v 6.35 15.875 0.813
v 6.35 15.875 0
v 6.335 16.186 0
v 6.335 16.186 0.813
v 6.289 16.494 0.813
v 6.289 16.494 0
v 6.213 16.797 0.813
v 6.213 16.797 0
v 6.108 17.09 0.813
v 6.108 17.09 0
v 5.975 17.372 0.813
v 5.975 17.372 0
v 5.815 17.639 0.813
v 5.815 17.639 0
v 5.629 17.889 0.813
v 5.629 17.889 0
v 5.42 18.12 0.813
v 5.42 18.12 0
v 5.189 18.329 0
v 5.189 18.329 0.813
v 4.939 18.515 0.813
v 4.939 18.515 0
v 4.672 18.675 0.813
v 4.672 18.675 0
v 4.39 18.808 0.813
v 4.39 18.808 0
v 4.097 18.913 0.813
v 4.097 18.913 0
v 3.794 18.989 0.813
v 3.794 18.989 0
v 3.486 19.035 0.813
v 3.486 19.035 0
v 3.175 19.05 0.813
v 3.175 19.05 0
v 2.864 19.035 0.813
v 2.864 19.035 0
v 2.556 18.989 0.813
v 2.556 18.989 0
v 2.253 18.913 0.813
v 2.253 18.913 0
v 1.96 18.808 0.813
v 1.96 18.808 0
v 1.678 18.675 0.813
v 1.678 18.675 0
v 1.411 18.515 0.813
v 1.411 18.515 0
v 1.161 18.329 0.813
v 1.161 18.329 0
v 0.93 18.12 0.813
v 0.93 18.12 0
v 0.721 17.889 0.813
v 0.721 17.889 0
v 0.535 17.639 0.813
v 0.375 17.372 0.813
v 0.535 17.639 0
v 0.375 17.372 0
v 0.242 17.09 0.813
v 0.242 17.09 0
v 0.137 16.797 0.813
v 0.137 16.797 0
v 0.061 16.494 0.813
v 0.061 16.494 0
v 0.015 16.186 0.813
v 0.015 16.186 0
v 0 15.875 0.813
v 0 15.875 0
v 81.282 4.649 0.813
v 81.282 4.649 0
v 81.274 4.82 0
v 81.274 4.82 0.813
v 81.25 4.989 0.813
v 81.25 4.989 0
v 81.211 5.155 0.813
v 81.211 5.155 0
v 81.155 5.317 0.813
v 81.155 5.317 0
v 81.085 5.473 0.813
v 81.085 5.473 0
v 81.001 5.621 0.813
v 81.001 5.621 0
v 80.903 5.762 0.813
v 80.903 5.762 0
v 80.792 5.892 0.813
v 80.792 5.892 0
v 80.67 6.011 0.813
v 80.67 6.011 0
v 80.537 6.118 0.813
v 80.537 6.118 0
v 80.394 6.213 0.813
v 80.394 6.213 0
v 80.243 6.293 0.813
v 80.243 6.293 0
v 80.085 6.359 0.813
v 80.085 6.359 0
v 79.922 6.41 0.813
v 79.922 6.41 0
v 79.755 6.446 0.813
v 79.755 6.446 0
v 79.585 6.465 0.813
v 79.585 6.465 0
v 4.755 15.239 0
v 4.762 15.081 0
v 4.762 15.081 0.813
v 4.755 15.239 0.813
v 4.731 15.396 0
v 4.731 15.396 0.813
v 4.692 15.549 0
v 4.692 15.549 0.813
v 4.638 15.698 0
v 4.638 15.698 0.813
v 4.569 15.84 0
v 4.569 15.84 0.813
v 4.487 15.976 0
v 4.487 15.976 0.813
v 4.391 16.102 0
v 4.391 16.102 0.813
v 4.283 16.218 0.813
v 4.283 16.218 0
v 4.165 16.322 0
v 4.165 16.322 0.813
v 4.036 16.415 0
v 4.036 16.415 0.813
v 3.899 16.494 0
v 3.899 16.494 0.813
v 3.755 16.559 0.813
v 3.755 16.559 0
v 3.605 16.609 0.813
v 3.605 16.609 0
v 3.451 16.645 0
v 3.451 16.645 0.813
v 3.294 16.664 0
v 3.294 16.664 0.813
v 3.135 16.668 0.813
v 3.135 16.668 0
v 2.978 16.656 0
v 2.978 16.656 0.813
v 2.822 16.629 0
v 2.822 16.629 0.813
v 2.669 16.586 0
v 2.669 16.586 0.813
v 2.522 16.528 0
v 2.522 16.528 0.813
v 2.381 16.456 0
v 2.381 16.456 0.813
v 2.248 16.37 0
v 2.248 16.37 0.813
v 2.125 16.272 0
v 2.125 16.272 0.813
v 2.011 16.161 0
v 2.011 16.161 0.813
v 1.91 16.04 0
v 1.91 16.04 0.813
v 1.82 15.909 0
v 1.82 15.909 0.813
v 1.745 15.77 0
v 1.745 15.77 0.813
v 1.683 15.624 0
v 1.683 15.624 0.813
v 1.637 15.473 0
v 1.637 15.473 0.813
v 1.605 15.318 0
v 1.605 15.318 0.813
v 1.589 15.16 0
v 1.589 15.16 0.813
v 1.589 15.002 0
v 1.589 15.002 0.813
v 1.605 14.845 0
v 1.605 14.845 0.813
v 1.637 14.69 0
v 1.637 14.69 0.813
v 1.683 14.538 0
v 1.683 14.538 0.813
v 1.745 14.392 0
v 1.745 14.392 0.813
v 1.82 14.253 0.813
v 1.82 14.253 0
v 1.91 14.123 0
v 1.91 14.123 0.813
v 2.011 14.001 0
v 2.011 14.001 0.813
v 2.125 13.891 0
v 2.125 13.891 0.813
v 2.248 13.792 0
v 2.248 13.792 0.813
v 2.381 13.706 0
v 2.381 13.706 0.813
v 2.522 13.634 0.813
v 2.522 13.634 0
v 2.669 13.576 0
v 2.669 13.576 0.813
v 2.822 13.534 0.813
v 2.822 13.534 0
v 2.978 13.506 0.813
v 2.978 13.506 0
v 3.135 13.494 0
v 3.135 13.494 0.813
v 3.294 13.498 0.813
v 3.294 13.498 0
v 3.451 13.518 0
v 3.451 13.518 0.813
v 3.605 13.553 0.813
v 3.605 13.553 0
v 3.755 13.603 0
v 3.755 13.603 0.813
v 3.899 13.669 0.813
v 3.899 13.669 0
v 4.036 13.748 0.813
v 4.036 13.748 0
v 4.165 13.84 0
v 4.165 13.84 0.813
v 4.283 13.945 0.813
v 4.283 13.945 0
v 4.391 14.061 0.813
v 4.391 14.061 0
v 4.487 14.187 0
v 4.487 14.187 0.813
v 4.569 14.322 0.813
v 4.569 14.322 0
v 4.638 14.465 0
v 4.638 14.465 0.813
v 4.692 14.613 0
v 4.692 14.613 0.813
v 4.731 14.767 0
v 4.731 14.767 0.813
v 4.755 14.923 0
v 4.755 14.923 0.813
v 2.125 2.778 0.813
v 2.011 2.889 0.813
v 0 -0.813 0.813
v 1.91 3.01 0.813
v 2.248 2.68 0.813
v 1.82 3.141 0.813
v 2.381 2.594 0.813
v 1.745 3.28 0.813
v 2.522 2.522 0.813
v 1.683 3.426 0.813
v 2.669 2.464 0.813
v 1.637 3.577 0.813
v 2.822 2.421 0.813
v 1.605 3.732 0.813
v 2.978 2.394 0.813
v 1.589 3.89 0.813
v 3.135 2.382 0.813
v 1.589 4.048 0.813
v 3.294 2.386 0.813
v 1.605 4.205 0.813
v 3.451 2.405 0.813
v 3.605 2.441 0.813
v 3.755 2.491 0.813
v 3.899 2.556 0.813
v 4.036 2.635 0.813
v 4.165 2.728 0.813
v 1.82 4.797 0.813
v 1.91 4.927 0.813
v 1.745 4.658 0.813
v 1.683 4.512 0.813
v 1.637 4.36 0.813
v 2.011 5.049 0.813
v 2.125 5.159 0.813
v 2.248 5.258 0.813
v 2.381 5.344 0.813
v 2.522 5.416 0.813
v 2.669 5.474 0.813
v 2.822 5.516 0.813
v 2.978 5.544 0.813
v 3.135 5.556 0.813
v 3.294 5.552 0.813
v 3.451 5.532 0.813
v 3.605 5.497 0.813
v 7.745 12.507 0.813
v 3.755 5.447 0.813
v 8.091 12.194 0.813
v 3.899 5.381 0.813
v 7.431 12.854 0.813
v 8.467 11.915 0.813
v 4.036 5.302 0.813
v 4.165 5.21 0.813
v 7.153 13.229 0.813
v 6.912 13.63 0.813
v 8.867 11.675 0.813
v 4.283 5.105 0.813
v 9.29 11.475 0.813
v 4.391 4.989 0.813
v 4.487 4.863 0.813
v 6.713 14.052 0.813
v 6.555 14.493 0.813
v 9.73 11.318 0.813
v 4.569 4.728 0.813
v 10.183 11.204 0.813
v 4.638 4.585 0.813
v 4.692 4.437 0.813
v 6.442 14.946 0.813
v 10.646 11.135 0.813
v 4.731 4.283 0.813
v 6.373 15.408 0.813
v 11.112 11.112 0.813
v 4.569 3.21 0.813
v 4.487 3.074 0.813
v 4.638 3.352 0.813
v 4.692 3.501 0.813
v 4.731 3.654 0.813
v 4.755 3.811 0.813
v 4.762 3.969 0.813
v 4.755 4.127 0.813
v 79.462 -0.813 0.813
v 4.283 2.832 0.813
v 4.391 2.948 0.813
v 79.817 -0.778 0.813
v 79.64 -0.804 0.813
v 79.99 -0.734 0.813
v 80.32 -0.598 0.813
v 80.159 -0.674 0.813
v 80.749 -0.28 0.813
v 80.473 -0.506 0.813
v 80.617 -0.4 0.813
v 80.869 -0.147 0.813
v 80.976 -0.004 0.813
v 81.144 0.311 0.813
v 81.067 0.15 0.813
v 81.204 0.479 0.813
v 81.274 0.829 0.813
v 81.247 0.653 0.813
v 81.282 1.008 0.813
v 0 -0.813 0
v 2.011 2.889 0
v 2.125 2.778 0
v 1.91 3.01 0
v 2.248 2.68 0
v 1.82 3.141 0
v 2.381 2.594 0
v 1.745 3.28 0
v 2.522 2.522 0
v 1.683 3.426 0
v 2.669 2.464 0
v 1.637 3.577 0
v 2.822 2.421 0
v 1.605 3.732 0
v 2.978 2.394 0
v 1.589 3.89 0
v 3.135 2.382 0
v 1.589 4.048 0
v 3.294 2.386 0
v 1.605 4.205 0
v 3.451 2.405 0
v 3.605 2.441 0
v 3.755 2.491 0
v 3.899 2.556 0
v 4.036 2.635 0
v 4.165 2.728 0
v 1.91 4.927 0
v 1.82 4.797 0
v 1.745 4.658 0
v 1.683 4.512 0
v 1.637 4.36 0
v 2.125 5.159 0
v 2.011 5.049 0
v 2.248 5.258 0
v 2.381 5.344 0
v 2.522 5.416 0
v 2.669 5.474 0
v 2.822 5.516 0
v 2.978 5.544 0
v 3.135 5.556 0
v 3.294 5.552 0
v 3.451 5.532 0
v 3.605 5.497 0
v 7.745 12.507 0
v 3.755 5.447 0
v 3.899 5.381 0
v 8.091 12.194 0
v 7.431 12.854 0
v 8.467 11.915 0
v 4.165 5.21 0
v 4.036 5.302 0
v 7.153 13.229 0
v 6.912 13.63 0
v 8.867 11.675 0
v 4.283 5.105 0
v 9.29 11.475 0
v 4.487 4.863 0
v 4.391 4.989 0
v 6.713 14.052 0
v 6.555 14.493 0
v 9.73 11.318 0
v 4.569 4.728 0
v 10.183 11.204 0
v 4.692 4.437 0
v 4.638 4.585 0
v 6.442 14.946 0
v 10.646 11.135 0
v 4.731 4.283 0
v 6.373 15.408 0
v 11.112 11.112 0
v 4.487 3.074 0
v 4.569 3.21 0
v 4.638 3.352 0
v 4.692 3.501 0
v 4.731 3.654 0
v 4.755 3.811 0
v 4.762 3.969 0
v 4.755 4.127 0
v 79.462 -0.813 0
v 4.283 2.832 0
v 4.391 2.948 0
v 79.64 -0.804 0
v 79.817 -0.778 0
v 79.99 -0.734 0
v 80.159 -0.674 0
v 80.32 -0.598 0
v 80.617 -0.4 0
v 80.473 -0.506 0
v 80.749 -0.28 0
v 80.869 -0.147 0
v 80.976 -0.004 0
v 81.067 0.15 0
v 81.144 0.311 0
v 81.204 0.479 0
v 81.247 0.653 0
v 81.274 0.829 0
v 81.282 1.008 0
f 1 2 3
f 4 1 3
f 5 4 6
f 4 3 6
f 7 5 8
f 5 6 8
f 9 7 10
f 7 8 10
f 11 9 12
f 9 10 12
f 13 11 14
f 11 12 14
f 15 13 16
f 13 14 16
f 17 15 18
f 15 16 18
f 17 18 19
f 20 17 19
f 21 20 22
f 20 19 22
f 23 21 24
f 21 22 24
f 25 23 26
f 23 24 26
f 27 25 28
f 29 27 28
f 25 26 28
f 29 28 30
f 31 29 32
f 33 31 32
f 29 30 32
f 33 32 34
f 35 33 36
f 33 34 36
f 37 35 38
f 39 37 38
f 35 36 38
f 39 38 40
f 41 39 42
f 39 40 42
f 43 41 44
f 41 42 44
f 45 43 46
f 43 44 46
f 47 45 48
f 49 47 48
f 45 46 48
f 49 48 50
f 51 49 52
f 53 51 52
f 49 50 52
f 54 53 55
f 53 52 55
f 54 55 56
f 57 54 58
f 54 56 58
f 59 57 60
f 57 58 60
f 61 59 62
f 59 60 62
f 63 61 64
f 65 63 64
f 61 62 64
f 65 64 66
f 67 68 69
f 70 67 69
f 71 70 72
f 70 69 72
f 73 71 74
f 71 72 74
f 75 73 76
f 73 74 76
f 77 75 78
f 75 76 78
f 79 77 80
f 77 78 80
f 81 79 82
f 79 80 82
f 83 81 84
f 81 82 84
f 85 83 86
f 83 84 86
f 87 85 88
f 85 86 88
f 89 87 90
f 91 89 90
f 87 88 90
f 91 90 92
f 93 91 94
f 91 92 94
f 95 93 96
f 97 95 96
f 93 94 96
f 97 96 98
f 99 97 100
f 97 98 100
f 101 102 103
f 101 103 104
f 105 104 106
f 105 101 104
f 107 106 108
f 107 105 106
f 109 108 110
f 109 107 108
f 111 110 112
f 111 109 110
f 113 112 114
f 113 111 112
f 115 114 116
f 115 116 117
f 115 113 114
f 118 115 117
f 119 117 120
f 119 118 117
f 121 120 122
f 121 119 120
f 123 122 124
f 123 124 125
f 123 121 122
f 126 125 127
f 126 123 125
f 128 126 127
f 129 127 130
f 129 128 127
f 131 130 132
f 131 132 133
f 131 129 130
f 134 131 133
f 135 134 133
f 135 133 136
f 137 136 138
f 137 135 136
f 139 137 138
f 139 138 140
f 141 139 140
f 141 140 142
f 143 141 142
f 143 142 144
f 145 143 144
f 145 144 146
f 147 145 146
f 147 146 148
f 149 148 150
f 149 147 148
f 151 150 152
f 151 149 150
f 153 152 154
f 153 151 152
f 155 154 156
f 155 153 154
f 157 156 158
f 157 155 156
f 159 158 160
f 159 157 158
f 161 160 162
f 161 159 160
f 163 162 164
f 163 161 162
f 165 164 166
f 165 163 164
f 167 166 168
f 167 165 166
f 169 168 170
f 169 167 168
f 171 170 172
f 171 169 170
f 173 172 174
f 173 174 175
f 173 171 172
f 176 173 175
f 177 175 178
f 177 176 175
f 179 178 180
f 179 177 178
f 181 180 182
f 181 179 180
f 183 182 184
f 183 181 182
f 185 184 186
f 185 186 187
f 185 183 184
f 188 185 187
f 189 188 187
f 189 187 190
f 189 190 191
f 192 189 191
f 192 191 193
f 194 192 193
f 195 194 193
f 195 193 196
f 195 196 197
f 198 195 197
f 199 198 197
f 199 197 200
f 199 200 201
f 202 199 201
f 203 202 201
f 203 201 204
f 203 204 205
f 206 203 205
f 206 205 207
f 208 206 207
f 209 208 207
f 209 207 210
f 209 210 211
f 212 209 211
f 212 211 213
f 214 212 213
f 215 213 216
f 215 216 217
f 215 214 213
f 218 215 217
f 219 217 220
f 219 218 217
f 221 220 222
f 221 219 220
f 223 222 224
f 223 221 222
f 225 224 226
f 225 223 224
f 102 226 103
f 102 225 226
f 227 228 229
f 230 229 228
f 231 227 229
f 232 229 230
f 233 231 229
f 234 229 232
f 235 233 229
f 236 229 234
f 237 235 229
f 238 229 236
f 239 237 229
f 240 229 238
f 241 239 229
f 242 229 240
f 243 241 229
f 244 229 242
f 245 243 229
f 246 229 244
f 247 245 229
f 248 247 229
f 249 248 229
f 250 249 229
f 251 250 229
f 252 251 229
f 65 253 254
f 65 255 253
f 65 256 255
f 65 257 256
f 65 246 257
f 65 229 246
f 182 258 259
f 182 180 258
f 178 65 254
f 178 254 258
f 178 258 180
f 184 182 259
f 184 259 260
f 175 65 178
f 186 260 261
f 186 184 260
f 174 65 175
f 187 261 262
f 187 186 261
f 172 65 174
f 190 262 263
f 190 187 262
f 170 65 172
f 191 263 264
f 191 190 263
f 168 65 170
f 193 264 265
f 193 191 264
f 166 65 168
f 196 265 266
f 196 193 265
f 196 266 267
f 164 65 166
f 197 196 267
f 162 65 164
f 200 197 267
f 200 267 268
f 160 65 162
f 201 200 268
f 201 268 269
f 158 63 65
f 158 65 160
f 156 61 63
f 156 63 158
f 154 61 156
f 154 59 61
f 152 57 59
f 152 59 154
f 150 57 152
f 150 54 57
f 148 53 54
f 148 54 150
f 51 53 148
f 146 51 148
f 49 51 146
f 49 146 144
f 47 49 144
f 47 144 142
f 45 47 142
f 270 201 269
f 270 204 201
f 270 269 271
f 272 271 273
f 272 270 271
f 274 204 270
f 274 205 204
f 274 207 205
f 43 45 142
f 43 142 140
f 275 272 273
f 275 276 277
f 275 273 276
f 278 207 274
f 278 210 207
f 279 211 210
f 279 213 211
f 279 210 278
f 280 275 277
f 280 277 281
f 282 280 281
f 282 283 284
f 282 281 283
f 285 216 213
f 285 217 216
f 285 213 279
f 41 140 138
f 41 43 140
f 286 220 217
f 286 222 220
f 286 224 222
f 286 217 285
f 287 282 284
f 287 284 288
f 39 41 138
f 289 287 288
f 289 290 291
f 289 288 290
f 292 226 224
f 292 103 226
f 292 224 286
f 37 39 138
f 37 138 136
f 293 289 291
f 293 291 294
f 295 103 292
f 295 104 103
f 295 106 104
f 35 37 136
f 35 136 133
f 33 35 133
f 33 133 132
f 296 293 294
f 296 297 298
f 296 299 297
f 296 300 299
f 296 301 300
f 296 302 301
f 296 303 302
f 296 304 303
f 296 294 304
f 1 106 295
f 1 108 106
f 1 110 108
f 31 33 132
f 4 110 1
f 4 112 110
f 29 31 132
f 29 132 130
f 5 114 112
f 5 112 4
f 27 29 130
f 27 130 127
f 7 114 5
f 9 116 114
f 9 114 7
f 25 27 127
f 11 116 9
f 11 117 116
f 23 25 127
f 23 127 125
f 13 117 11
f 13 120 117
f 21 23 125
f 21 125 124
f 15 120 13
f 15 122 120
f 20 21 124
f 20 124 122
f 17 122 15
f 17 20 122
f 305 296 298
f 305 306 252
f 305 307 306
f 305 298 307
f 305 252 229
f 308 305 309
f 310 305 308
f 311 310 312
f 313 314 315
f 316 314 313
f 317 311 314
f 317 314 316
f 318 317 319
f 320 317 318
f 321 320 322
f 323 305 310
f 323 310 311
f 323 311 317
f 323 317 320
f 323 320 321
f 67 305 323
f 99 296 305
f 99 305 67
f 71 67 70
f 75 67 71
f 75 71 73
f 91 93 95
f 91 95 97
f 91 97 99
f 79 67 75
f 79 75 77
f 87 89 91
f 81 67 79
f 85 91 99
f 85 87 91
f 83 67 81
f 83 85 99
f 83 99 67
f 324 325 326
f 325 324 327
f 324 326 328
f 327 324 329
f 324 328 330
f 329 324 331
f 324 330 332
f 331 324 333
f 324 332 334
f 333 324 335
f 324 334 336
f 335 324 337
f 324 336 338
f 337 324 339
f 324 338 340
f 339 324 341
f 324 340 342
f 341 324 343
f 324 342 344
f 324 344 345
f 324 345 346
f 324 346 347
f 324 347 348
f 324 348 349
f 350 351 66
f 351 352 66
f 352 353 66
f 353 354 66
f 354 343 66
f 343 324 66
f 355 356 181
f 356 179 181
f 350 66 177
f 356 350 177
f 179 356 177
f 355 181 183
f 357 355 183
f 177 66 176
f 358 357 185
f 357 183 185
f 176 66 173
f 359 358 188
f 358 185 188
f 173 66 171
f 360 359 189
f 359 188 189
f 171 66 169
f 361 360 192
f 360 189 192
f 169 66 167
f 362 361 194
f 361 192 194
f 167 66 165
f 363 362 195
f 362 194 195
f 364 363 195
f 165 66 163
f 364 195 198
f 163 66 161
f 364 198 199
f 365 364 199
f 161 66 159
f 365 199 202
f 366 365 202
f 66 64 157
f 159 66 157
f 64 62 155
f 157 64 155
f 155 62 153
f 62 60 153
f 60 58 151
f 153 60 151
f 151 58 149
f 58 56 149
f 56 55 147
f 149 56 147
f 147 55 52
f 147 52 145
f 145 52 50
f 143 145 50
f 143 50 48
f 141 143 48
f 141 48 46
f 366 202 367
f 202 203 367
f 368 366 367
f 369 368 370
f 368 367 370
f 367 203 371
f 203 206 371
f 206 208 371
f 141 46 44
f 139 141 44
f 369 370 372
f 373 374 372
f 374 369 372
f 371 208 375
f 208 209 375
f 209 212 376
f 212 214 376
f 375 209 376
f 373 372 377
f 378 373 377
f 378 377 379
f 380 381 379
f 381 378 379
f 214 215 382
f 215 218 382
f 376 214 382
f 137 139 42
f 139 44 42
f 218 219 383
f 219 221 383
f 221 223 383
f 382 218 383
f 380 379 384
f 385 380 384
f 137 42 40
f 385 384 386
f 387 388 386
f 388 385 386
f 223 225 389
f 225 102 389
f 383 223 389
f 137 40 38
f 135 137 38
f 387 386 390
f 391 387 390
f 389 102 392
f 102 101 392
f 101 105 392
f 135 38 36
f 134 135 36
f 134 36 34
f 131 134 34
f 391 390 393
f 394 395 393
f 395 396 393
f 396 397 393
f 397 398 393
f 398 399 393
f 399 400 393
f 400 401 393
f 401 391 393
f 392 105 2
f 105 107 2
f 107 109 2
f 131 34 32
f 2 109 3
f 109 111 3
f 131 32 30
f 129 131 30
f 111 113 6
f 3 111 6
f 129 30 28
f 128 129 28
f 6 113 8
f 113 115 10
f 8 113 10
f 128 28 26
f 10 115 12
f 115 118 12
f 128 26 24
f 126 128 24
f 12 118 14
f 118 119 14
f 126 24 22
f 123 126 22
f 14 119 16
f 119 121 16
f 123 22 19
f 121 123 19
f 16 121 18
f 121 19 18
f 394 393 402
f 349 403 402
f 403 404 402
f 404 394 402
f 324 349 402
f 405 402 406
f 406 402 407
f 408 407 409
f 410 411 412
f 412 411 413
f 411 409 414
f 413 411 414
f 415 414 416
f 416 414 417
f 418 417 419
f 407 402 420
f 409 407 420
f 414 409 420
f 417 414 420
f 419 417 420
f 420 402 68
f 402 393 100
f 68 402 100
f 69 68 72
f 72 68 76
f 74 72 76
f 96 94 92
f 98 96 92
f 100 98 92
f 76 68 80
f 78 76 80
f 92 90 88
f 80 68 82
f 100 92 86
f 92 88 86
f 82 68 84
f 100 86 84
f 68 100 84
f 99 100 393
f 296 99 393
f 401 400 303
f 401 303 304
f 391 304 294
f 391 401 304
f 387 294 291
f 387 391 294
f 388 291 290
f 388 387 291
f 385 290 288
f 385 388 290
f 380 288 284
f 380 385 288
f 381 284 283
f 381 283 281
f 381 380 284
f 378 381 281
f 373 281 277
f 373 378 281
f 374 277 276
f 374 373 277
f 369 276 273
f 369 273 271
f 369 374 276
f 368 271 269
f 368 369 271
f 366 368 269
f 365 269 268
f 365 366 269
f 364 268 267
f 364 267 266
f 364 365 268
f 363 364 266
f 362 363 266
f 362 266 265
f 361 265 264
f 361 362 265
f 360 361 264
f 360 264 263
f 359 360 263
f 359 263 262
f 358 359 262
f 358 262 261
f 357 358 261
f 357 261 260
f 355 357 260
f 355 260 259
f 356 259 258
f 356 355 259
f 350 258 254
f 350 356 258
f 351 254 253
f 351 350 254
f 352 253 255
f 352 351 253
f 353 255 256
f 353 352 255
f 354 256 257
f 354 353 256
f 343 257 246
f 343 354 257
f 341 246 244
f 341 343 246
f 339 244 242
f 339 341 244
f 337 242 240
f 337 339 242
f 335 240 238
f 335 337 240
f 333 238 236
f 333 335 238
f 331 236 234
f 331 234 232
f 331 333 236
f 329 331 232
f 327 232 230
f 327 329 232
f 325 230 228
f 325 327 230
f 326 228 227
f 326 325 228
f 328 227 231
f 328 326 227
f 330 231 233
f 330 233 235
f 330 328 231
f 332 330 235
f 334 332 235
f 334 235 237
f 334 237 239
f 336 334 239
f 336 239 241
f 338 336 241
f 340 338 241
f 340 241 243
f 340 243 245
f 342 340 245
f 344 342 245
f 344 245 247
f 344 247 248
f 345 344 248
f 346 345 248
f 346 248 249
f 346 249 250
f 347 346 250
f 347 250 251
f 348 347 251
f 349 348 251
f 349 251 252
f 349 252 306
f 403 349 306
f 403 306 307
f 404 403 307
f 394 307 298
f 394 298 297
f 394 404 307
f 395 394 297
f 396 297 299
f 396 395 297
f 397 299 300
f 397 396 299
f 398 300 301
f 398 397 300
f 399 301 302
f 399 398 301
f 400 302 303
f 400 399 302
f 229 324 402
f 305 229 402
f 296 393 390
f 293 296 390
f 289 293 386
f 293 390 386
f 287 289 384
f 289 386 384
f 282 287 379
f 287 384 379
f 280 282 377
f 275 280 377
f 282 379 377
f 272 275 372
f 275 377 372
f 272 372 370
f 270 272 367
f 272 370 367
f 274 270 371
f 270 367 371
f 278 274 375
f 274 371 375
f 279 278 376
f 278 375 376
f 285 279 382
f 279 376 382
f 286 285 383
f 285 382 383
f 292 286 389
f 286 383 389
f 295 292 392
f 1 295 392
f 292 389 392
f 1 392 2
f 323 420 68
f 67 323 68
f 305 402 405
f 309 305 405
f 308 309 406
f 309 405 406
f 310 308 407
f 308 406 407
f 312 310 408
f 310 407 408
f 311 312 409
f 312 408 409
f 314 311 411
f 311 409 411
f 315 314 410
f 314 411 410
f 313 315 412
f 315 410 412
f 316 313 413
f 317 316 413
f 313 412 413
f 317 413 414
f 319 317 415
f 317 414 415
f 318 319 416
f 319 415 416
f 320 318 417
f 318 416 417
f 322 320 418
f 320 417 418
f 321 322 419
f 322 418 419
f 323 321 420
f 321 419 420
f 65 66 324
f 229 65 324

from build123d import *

# Parameters (mm, degrees)
SKETCH1_R           = 1.5875
BOSS_EXTRUDE1_DEPTH = 0.8128


with BuildPart() as part:
    # Sketch1 → Boss-Extrude1 (new body)
    with BuildSketch(Plane.XY):
        with BuildLine():
            Line((0, -0.8128), (79.461894979, -0.8128))
            ThreePointArc((79.461894979, -0.8128), (80.749213577, -0.279575177), (81.2824384, 1.007743421))
            Line((81.2824384, 1.007743421), (81.2824384, 4.648830263))
            ThreePointArc((81.2824384, 4.648830263), (80.792085251, 5.891799366), (79.585173538, 6.465194969))
            Line((79.585173538, 6.465194969), (11.1125, 11.1125))
            ThreePointArc((11.1125, 11.1125), (7.744903955, 12.507403955), (6.35, 15.875))
            ThreePointArc((6.35, 15.875), (3.175, 19.05), (0, 15.875))
            Line((0, 15.875), (0, -0.8128))
        make_face()
        with Locations((3.175, 3.96875)):
            Circle(SKETCH1_R, mode=Mode.SUBTRACT)
        with Locations((3.175, 15.08125)):
            Circle(SKETCH1_R, mode=Mode.SUBTRACT)
    extrude(amount=BOSS_EXTRUDE1_DEPTH)


solid = part.part
